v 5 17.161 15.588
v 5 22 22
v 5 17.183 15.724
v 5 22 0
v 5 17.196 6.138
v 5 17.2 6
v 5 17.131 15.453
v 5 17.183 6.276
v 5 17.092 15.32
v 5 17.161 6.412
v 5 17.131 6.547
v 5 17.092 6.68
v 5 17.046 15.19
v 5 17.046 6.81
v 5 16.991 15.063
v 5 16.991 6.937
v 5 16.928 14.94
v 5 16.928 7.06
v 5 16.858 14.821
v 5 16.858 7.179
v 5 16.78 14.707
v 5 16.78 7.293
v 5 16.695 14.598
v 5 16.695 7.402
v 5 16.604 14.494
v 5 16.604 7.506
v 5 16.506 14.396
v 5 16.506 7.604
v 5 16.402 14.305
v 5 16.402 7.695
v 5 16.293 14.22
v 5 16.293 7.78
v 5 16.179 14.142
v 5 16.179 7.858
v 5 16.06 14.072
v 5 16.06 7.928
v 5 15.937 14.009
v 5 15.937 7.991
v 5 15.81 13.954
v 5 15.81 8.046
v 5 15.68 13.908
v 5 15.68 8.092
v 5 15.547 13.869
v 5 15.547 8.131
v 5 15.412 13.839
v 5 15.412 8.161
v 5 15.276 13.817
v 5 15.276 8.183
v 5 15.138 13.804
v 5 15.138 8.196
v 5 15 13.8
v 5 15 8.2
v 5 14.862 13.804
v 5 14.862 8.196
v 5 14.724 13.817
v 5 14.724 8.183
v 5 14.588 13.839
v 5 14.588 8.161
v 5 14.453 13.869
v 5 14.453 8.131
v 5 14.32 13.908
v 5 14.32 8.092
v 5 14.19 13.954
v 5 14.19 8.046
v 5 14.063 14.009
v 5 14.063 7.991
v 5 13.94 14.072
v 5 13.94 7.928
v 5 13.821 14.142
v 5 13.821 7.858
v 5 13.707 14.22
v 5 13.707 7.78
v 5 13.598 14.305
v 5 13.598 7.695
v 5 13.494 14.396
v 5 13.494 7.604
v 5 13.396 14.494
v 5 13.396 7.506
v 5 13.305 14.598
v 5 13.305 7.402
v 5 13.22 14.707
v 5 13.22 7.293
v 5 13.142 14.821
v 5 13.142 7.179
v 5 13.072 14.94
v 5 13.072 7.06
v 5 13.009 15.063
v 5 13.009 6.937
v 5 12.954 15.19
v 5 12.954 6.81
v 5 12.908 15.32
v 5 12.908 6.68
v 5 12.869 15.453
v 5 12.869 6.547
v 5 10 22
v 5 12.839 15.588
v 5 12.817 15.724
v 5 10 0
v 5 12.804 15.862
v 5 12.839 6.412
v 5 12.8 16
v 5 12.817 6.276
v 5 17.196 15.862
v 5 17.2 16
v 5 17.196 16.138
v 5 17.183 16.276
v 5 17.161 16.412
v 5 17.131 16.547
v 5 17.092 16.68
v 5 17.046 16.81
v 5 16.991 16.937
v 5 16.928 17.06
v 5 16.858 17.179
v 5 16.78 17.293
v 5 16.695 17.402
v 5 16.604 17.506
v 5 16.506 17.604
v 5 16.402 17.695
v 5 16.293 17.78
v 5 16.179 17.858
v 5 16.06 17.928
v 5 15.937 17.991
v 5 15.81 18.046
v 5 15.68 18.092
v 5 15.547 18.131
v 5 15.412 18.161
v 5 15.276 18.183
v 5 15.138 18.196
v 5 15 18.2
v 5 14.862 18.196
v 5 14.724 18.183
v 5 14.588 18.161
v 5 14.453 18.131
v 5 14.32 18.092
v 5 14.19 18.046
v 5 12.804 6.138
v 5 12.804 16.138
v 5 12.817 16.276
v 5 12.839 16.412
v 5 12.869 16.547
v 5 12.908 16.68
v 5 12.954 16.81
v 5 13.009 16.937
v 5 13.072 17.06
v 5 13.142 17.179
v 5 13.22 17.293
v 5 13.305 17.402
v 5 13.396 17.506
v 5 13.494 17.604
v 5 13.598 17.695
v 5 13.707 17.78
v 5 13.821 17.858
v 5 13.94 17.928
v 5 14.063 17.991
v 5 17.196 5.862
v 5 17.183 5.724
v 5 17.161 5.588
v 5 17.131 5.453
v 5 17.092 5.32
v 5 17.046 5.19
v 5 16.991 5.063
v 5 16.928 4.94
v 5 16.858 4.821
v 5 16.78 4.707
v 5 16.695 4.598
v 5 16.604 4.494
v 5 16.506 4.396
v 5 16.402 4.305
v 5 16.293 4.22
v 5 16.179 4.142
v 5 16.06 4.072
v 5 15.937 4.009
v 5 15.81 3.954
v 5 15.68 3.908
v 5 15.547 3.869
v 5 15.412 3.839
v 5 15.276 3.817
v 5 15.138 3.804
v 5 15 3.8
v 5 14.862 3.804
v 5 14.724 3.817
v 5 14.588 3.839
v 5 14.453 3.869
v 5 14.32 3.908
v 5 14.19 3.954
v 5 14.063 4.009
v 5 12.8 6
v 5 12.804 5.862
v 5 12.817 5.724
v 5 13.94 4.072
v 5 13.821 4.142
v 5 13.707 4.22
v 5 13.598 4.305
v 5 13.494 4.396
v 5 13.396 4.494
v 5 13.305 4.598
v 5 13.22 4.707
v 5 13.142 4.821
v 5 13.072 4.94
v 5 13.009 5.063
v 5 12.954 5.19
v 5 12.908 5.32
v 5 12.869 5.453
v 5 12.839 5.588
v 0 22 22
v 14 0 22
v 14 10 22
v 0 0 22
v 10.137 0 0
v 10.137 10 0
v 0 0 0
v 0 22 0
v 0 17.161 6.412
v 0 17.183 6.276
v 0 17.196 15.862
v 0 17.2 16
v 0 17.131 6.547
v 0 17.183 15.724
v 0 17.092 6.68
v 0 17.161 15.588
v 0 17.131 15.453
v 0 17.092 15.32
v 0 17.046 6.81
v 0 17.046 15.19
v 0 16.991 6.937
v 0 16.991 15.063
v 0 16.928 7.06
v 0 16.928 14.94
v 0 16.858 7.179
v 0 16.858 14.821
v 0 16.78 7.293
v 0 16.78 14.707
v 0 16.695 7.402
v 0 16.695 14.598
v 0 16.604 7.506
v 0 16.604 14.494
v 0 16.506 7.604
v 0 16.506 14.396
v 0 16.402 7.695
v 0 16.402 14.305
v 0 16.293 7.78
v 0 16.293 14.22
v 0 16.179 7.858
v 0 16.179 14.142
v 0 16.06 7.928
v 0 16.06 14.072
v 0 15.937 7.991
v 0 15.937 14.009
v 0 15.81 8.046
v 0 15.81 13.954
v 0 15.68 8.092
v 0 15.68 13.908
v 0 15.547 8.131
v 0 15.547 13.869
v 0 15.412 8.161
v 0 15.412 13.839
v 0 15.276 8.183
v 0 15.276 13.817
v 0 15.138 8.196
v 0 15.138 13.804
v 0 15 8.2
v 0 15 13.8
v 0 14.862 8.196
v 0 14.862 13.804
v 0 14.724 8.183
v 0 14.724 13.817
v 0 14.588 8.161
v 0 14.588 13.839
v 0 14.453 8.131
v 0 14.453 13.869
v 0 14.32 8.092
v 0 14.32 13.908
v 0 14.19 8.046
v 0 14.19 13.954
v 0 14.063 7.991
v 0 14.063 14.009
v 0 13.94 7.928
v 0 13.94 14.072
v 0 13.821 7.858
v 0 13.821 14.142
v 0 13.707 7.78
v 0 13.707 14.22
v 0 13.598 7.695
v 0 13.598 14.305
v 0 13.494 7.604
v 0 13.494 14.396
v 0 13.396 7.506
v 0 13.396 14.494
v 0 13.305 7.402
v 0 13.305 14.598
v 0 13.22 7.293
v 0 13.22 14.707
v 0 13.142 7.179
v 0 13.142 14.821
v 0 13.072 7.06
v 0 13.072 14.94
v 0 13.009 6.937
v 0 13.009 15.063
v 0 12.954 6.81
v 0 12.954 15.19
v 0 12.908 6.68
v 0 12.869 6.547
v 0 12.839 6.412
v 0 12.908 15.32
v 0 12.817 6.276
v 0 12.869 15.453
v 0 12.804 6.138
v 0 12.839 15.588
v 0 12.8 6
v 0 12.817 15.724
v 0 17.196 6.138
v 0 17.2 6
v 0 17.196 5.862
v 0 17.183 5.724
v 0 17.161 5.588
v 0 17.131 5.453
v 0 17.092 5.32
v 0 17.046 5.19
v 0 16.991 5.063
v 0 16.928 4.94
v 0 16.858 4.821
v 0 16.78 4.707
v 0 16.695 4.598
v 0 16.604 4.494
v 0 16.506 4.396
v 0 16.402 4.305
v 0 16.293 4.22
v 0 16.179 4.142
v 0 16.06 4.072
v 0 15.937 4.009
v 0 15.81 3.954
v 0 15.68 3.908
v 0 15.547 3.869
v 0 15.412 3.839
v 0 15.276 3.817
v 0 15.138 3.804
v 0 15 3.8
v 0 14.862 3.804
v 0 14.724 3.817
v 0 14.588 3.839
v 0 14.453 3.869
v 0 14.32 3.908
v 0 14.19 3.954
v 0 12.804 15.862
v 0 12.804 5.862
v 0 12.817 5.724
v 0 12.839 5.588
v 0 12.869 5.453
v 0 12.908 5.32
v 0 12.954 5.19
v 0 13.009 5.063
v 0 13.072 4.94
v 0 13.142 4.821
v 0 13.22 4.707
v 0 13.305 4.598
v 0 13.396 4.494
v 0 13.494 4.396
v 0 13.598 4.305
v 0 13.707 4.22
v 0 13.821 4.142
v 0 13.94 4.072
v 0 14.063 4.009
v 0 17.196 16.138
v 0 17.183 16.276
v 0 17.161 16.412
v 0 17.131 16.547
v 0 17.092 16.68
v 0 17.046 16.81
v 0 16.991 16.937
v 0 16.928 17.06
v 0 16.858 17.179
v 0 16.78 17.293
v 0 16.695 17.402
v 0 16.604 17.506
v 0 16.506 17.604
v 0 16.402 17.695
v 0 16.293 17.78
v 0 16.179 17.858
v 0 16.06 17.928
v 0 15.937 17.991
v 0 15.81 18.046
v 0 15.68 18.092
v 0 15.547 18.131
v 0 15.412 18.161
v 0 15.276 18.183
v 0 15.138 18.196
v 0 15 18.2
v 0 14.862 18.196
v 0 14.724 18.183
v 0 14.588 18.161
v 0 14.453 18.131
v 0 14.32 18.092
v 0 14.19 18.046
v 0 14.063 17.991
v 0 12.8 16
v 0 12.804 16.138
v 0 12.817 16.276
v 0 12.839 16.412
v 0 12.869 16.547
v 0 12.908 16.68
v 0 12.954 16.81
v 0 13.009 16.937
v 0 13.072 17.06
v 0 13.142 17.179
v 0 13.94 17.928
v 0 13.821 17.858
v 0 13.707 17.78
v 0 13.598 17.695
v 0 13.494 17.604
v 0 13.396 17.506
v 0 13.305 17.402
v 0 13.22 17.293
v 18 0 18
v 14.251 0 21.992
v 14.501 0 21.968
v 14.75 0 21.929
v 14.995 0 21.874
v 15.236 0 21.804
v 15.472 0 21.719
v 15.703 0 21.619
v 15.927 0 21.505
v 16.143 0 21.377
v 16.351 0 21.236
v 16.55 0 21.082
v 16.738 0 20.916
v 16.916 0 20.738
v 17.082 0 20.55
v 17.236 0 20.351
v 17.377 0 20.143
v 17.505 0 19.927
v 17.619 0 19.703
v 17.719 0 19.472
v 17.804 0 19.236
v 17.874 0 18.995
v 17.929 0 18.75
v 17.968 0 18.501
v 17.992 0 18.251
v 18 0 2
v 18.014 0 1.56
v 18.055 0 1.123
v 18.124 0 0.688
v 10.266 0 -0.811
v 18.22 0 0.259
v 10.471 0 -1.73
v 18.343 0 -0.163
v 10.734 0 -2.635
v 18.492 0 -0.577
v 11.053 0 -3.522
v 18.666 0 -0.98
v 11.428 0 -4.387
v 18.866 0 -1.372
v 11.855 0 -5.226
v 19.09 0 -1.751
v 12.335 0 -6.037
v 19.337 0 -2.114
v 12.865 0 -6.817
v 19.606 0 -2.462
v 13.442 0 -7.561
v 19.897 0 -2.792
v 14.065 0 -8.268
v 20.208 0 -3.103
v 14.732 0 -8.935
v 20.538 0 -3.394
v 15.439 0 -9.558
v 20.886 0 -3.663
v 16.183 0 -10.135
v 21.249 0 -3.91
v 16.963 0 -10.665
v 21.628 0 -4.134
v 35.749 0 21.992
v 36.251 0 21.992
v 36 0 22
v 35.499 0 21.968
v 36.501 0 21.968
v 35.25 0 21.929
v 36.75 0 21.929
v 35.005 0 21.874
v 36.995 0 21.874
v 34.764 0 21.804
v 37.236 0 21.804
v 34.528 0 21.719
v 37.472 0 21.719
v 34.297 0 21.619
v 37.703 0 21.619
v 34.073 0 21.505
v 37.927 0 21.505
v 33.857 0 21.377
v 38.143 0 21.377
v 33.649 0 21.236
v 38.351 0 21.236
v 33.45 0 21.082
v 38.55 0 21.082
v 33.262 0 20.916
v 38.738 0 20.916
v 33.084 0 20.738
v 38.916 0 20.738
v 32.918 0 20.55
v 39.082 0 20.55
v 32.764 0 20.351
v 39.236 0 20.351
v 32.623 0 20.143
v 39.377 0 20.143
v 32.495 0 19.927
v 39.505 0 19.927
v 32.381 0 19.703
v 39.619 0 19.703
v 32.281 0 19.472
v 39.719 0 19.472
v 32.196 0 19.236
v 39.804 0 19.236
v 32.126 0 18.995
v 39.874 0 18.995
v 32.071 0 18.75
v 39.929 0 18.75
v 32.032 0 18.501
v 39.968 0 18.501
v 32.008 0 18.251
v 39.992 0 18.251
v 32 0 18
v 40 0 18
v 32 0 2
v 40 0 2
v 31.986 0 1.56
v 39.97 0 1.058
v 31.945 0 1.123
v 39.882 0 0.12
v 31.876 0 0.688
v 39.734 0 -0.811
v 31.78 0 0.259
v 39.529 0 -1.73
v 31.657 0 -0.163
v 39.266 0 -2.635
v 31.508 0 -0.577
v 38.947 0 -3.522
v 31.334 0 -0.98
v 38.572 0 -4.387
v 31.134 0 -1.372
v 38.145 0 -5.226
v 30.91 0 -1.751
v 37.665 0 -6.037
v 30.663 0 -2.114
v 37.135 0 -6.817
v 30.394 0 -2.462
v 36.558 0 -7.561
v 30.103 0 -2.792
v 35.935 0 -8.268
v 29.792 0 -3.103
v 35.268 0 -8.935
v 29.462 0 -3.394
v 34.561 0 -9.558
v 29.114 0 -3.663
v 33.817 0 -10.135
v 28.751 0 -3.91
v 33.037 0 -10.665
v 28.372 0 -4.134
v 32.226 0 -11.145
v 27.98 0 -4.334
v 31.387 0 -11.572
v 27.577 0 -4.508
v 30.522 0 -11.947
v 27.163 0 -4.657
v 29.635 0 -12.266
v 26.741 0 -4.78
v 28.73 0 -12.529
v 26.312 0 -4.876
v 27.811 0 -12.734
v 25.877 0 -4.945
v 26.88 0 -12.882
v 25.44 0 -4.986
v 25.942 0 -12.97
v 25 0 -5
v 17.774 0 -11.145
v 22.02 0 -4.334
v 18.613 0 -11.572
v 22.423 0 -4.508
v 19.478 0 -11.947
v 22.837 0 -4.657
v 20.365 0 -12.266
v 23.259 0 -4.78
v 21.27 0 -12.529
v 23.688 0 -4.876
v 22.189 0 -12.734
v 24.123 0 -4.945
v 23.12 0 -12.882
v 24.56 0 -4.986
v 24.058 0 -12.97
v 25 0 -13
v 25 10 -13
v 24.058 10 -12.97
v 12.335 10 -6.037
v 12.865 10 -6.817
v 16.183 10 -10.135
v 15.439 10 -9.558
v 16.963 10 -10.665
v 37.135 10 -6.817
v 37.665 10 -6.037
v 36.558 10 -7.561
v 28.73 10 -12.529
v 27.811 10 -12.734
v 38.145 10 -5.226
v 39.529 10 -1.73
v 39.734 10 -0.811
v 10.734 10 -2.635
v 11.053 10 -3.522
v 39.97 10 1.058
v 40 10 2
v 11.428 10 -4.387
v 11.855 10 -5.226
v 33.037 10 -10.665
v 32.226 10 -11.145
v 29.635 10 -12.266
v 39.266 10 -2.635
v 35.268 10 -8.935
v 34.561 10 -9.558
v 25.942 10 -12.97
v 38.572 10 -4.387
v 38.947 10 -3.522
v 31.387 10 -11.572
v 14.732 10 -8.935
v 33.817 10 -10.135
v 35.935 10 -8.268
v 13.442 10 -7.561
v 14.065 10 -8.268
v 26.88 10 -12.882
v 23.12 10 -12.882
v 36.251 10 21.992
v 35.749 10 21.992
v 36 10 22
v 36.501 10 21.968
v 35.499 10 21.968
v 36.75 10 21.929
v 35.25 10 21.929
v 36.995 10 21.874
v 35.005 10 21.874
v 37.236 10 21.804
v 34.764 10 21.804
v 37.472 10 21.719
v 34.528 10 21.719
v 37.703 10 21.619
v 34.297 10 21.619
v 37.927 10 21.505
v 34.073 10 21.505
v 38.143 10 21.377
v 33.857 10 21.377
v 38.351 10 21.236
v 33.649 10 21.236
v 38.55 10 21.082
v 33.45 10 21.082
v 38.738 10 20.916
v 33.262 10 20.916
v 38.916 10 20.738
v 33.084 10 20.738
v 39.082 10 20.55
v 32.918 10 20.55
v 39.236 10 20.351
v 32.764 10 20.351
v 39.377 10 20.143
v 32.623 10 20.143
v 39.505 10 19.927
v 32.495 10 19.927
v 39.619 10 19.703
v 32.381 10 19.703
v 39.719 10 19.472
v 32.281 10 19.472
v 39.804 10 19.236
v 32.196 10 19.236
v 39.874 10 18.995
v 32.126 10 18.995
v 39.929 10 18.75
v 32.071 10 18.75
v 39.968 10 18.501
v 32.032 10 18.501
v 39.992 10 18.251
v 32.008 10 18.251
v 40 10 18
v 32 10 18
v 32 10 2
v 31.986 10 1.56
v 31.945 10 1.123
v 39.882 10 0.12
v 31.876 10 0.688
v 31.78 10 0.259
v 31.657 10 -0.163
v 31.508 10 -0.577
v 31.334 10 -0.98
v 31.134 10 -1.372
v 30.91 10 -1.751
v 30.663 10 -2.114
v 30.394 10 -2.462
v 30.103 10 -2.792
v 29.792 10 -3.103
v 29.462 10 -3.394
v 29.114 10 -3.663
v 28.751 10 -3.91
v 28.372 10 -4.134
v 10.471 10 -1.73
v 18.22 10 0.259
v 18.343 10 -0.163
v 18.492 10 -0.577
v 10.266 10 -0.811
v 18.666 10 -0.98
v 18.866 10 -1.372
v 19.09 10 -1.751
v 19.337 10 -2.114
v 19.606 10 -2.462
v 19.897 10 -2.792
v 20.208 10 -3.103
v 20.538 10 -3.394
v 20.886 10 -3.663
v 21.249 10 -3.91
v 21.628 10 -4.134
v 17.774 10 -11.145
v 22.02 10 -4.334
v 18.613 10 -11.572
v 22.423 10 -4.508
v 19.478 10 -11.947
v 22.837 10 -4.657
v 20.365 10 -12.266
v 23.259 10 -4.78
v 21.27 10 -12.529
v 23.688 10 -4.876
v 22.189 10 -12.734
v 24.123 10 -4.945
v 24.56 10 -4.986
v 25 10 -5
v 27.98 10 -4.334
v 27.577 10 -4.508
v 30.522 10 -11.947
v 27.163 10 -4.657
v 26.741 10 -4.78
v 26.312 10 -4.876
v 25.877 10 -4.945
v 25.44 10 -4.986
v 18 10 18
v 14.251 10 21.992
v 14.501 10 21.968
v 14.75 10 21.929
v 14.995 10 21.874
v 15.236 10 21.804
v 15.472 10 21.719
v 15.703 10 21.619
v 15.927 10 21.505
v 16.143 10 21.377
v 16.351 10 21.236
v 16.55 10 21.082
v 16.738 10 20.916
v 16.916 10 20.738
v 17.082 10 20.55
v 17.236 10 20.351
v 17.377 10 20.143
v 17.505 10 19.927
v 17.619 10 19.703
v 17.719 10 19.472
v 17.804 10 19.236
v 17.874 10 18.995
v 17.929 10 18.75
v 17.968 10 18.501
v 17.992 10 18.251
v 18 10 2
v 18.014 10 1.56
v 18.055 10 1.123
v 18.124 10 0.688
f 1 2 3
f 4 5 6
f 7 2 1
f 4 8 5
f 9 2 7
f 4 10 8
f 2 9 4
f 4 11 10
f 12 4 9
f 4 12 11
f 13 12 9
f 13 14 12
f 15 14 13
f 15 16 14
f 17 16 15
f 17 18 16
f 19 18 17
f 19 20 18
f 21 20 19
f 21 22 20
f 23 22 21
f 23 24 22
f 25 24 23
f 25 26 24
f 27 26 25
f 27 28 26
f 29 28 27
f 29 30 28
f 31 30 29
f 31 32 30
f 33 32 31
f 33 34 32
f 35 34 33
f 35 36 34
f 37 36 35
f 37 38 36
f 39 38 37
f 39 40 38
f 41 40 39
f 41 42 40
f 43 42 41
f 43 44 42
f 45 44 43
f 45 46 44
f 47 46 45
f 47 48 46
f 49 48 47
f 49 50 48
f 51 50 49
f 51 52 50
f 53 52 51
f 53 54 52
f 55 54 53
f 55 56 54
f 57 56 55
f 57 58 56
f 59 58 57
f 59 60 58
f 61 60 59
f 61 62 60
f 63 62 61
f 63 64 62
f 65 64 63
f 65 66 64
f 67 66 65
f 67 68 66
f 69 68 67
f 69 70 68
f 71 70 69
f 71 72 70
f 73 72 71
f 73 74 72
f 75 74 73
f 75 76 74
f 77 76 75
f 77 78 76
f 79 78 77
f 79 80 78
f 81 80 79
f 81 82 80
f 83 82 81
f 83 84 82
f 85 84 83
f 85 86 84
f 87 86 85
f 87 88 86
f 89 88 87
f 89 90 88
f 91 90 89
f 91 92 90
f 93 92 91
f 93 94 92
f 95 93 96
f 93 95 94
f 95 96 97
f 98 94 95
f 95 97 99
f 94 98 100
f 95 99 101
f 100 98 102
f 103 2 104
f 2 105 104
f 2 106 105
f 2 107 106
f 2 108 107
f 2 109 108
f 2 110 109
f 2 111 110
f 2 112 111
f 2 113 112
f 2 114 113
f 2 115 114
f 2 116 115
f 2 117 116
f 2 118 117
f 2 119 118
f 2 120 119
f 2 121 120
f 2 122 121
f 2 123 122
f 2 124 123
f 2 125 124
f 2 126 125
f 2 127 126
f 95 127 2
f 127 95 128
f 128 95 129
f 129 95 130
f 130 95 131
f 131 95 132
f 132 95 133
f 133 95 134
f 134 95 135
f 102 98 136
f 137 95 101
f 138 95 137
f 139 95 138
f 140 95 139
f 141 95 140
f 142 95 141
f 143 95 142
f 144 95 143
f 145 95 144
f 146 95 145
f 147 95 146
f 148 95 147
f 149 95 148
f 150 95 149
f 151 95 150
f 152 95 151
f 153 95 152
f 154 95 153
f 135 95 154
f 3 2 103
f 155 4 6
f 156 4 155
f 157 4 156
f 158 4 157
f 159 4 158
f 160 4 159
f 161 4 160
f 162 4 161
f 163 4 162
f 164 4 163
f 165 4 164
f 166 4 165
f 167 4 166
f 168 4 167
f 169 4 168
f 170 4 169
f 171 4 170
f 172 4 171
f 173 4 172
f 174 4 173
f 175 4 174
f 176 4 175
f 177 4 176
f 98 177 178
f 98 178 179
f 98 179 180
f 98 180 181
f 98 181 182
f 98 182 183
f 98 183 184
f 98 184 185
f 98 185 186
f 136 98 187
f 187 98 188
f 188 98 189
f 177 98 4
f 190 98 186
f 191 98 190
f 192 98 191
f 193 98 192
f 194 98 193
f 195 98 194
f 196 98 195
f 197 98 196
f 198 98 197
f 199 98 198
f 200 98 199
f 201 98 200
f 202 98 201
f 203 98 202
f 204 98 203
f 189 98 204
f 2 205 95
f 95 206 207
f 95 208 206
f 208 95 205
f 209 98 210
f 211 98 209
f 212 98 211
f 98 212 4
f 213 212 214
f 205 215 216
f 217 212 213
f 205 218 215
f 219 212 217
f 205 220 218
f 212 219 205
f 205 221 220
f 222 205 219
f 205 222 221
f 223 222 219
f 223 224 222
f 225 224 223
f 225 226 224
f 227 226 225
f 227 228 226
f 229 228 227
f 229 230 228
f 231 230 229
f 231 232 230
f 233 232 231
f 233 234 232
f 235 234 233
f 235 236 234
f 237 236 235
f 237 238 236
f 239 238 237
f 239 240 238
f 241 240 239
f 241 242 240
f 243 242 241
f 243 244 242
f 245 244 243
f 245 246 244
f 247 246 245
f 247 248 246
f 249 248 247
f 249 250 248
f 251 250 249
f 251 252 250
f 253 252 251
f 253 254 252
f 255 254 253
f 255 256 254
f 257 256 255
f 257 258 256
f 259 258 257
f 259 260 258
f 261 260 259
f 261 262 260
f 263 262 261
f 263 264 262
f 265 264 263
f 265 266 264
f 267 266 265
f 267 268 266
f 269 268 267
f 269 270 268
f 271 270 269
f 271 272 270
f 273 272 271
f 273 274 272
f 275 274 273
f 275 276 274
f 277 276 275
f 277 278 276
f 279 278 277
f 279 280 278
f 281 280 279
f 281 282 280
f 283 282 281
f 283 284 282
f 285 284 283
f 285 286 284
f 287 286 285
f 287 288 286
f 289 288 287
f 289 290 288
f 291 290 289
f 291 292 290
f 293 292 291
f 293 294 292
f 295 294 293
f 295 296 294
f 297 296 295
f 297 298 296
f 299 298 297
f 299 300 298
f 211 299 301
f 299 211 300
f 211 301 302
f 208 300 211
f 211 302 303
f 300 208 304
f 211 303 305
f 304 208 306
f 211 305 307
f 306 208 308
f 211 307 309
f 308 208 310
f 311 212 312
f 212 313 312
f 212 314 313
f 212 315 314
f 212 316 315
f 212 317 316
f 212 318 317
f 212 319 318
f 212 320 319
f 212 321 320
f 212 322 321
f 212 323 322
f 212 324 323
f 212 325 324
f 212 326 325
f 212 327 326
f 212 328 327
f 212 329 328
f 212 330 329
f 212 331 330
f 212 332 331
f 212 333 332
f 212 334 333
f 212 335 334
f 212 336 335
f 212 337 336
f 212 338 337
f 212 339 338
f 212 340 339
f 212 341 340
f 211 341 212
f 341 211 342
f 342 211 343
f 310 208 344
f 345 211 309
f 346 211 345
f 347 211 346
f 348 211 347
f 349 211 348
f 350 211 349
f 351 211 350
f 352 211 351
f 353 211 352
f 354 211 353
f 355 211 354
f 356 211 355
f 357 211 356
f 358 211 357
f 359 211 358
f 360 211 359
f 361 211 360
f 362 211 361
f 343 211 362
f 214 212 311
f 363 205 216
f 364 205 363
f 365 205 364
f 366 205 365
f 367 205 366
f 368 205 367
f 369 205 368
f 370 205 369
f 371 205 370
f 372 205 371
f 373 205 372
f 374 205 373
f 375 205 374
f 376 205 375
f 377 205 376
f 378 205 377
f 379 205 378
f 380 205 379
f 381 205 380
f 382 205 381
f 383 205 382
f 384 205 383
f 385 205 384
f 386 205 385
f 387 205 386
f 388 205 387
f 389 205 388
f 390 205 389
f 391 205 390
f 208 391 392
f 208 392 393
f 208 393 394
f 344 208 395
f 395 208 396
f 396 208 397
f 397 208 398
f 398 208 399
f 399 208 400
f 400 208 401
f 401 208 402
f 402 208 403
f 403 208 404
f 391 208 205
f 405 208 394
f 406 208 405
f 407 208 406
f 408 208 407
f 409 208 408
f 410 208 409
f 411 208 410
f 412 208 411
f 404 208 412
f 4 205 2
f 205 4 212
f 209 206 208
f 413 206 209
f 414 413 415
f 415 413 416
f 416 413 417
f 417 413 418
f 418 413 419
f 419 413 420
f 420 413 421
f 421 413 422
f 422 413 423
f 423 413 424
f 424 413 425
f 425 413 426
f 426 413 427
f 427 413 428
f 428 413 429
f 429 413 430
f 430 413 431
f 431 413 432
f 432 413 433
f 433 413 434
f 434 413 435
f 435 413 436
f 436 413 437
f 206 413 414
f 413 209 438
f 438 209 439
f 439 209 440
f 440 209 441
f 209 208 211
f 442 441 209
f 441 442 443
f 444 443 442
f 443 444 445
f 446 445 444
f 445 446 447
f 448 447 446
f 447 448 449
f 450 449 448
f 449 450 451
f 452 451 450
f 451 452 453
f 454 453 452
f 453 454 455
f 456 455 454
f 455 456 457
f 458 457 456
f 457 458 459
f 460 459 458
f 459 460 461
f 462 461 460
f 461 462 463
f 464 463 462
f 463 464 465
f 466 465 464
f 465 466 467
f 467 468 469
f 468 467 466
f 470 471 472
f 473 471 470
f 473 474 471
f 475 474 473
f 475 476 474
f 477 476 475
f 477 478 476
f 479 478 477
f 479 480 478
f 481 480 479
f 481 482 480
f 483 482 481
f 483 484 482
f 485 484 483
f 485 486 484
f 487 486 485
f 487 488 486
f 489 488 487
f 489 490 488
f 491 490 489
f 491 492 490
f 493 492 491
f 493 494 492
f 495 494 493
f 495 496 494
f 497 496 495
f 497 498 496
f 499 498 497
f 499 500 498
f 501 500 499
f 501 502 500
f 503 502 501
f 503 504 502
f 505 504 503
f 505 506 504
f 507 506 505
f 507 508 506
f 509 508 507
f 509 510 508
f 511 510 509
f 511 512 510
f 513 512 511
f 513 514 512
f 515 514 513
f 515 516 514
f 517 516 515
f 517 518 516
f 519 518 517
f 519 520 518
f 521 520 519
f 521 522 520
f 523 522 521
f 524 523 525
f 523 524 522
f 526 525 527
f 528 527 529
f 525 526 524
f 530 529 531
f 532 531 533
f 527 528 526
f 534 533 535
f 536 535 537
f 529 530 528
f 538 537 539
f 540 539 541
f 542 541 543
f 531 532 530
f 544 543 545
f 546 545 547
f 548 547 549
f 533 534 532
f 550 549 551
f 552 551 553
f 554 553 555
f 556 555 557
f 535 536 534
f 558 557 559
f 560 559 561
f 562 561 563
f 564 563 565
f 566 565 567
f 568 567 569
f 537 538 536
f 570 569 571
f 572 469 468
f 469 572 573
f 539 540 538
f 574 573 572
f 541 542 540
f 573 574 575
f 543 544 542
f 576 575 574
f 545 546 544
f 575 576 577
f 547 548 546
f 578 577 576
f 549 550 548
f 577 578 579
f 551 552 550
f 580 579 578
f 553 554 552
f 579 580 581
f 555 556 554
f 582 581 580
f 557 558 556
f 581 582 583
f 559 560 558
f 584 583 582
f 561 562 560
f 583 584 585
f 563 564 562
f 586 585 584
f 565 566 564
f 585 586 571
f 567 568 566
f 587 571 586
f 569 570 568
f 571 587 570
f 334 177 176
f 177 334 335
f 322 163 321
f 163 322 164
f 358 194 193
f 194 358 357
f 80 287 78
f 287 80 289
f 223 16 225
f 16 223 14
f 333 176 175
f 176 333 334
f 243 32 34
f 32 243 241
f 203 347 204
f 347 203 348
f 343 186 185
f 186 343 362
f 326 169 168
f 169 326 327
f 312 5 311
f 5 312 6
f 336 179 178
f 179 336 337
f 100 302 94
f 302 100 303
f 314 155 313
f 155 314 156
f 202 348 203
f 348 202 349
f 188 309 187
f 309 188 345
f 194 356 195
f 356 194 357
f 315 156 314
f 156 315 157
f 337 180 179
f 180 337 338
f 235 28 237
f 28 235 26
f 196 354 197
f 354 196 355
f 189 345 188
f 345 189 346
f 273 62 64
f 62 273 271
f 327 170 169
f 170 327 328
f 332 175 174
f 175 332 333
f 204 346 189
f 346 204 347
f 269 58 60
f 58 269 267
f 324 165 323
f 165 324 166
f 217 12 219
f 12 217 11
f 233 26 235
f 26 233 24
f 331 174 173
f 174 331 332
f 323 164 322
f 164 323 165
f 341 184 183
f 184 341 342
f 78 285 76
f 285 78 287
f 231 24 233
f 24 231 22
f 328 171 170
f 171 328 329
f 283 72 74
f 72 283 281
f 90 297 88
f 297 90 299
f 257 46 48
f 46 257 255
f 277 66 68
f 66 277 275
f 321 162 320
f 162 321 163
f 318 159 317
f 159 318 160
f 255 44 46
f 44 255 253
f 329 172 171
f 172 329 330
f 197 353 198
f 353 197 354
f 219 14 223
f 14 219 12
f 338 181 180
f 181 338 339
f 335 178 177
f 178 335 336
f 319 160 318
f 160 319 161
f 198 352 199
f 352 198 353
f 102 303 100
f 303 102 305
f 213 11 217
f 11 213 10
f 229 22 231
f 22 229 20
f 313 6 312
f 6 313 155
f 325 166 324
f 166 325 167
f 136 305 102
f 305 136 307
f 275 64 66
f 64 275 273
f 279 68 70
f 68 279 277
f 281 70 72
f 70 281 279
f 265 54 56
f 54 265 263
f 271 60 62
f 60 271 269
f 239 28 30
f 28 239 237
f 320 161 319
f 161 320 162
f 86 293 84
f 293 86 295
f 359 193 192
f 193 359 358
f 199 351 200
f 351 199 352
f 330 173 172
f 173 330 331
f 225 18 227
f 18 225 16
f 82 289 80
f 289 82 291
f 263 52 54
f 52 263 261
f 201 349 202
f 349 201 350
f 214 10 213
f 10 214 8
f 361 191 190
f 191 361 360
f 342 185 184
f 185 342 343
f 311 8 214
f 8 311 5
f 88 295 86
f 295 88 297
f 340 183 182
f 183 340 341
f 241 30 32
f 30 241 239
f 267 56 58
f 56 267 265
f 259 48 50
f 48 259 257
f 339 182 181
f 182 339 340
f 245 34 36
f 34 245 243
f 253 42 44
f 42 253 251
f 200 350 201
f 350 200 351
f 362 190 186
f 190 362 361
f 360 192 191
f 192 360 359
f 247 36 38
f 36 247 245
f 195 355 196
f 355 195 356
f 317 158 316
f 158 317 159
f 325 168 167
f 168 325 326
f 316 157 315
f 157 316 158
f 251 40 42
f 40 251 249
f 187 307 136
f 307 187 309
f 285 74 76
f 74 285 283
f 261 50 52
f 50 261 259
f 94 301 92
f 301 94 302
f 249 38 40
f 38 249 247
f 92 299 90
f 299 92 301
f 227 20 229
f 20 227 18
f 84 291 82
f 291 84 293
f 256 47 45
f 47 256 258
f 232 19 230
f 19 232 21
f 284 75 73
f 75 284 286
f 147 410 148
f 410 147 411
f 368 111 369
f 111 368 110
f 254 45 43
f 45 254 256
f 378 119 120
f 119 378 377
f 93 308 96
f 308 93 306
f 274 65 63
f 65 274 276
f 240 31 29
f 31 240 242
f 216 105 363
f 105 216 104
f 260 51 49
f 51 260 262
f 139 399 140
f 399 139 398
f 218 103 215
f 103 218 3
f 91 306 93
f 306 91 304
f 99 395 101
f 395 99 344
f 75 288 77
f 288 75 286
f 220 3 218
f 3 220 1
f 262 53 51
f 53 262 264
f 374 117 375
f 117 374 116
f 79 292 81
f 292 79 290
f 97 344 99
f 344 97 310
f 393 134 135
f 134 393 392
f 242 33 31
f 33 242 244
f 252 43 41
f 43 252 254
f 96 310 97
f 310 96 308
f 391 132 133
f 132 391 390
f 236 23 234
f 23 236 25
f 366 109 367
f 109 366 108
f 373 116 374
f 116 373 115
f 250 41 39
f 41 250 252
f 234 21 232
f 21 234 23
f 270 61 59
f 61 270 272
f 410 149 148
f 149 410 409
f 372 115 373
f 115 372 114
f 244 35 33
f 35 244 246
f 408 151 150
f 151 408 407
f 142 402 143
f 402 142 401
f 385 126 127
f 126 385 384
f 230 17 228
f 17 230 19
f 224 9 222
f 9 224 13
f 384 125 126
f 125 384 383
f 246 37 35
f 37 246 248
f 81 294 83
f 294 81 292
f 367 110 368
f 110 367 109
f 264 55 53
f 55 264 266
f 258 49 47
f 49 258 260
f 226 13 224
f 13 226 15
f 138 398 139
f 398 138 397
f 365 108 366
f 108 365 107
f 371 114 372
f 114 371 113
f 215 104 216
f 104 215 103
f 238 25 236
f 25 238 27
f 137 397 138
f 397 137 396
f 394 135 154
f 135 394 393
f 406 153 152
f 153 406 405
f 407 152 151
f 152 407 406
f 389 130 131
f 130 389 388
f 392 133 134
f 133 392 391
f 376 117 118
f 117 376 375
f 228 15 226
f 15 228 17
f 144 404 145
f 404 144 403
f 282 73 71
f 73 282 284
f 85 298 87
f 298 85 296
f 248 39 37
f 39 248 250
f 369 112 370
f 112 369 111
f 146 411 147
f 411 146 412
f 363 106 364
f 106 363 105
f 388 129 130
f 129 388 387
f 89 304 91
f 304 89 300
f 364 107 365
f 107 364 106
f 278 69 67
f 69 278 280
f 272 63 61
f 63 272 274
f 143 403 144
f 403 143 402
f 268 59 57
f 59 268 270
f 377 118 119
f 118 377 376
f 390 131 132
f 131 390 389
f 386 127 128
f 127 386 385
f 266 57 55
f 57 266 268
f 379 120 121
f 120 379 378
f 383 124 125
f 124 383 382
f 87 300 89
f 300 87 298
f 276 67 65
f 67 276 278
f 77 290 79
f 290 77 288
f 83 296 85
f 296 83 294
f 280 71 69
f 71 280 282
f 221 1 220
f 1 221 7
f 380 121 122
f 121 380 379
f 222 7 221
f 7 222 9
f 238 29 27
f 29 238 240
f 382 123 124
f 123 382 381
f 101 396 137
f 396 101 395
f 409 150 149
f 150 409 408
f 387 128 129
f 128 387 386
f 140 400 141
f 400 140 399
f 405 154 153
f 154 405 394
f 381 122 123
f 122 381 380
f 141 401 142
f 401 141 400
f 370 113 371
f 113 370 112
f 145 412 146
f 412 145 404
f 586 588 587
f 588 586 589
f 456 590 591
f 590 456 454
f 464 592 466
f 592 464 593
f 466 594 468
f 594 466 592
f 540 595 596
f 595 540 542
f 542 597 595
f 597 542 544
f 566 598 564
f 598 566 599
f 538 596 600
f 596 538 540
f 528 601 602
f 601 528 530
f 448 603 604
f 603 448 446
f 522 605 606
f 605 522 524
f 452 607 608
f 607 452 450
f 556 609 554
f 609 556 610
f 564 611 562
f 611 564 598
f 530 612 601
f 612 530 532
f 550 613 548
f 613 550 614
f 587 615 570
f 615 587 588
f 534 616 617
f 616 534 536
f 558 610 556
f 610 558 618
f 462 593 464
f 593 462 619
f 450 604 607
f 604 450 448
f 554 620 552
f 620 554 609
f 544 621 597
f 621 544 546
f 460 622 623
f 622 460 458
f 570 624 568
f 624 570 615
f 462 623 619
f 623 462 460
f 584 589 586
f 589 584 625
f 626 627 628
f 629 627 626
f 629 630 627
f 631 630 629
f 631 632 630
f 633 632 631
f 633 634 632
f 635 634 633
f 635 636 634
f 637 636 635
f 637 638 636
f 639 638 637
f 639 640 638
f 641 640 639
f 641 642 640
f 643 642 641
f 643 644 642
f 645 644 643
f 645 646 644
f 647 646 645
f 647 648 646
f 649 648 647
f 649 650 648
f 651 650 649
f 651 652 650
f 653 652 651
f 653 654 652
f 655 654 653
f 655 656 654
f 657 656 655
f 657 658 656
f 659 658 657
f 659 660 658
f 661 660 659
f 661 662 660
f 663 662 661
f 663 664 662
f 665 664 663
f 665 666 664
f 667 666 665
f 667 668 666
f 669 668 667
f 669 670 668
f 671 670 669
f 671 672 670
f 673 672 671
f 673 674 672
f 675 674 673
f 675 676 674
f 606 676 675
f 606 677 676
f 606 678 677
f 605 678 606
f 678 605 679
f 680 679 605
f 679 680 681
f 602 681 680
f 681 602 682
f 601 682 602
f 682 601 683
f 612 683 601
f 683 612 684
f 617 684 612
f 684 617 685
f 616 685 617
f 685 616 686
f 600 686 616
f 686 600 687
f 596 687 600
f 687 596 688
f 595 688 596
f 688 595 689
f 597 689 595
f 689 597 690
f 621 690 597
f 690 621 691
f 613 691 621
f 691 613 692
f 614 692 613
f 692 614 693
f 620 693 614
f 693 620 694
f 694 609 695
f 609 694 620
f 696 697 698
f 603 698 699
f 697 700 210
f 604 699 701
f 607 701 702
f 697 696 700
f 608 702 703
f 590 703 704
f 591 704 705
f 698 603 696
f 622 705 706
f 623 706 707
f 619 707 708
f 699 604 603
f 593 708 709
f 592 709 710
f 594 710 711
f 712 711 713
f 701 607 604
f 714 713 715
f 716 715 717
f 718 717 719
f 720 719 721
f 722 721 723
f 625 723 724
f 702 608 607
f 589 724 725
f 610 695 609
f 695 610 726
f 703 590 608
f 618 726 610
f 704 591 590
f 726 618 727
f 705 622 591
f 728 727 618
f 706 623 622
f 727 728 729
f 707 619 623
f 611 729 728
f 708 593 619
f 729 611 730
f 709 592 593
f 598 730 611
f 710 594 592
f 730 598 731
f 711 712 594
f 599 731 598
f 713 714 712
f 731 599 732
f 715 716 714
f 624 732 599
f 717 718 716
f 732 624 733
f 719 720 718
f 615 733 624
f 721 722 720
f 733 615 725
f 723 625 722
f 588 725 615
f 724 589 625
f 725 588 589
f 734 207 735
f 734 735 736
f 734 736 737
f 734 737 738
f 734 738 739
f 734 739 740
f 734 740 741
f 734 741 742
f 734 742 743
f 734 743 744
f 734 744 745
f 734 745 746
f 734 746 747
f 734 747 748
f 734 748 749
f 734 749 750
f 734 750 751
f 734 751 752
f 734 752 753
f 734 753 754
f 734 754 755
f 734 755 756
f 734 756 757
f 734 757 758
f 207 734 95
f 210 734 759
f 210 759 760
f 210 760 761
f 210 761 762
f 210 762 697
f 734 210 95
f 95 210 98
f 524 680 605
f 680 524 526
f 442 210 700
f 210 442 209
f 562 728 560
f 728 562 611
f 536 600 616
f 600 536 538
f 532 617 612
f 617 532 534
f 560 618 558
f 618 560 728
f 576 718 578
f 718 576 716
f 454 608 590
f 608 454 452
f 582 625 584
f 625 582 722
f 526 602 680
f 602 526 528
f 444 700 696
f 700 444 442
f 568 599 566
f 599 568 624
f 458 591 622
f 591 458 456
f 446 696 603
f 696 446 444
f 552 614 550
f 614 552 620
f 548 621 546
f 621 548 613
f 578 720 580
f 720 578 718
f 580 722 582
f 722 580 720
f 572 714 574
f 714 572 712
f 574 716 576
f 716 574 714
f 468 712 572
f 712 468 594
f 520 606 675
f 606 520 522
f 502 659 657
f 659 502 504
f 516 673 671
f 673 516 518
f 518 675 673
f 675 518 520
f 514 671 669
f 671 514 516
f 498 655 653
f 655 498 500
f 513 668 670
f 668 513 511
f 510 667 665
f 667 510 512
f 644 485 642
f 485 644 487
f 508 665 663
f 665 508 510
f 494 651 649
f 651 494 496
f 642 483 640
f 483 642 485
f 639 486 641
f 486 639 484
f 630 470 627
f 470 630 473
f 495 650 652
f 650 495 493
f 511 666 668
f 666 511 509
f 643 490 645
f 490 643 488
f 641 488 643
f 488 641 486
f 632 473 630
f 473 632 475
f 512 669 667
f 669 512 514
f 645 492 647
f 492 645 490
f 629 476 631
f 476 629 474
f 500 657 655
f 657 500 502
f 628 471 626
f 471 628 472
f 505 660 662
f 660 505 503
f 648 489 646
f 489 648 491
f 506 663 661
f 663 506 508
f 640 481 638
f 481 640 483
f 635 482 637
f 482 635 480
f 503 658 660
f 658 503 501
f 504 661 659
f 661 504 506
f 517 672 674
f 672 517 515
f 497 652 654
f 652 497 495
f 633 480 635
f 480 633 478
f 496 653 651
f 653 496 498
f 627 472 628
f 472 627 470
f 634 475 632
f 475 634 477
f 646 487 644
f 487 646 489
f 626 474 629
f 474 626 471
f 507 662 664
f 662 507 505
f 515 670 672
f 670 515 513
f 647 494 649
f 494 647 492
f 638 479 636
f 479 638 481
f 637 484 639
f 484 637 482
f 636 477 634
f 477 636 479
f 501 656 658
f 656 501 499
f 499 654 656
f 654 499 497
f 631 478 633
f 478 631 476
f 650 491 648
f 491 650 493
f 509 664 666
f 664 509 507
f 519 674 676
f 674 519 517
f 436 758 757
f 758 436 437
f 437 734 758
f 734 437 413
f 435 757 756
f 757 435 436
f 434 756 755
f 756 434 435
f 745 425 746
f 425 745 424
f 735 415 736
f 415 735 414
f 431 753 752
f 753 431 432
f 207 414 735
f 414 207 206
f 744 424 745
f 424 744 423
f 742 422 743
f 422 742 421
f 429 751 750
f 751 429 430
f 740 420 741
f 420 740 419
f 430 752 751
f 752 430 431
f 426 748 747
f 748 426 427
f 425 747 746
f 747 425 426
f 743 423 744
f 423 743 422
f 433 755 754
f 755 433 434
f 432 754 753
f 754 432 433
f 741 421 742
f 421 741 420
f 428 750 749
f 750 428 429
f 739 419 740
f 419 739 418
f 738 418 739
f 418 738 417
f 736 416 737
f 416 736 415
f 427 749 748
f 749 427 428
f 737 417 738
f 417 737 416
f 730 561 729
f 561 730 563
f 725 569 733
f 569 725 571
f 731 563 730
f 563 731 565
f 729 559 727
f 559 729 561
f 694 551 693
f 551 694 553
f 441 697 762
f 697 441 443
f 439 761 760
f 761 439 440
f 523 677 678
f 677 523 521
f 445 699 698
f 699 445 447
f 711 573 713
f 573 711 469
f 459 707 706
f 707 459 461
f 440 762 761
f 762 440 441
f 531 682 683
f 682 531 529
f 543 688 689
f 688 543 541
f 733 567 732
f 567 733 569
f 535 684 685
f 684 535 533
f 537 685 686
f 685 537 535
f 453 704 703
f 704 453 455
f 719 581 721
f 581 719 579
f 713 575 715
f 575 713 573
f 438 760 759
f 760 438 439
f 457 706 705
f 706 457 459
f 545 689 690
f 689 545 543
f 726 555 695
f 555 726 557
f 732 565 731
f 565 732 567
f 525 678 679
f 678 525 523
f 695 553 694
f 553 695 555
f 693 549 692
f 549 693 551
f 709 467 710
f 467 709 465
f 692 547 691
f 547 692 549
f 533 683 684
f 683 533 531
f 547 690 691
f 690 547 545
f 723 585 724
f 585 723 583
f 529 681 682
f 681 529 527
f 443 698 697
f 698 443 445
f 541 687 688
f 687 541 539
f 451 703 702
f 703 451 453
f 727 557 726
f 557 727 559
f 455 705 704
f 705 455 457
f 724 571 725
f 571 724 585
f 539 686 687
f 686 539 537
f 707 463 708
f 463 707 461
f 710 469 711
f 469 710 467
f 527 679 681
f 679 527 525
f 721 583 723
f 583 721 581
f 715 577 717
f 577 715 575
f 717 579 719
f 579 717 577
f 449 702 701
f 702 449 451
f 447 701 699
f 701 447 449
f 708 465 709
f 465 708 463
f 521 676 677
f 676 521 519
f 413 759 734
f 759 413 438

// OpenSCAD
$fn = 100;

difference() {
  
  cube([5, 22, 22]);

  translate([-1, 15, 6])
    rotate([0, 90, 0])
      cylinder(10, 2.2, 2.2);

  translate([-1, 15, 16])
    rotate([0, 90, 0])
      cylinder(10, 2.2, 2.2);

}

translate([0, 0, 0]) {
  cube([14, 10, 22]);
}


translate([25, 10, 2])
rotate([90, 0, 0])
difference() {
  union() {
    cylinder(10, 15, 15);
    
    translate([-15, 0, 0])
      cube([30, 16, 10]);
    
    translate([11, 16, 0])
     cylinder(10, 4, 4);
    
    translate([-11, 16, 0])
     cylinder(10, 4, 4);
  }
  
  translate([0, 0, -1])
    cylinder(12, 7, 7);
  
  translate([-7, 0, -1])
    cube([14, 150, 12]);
}
